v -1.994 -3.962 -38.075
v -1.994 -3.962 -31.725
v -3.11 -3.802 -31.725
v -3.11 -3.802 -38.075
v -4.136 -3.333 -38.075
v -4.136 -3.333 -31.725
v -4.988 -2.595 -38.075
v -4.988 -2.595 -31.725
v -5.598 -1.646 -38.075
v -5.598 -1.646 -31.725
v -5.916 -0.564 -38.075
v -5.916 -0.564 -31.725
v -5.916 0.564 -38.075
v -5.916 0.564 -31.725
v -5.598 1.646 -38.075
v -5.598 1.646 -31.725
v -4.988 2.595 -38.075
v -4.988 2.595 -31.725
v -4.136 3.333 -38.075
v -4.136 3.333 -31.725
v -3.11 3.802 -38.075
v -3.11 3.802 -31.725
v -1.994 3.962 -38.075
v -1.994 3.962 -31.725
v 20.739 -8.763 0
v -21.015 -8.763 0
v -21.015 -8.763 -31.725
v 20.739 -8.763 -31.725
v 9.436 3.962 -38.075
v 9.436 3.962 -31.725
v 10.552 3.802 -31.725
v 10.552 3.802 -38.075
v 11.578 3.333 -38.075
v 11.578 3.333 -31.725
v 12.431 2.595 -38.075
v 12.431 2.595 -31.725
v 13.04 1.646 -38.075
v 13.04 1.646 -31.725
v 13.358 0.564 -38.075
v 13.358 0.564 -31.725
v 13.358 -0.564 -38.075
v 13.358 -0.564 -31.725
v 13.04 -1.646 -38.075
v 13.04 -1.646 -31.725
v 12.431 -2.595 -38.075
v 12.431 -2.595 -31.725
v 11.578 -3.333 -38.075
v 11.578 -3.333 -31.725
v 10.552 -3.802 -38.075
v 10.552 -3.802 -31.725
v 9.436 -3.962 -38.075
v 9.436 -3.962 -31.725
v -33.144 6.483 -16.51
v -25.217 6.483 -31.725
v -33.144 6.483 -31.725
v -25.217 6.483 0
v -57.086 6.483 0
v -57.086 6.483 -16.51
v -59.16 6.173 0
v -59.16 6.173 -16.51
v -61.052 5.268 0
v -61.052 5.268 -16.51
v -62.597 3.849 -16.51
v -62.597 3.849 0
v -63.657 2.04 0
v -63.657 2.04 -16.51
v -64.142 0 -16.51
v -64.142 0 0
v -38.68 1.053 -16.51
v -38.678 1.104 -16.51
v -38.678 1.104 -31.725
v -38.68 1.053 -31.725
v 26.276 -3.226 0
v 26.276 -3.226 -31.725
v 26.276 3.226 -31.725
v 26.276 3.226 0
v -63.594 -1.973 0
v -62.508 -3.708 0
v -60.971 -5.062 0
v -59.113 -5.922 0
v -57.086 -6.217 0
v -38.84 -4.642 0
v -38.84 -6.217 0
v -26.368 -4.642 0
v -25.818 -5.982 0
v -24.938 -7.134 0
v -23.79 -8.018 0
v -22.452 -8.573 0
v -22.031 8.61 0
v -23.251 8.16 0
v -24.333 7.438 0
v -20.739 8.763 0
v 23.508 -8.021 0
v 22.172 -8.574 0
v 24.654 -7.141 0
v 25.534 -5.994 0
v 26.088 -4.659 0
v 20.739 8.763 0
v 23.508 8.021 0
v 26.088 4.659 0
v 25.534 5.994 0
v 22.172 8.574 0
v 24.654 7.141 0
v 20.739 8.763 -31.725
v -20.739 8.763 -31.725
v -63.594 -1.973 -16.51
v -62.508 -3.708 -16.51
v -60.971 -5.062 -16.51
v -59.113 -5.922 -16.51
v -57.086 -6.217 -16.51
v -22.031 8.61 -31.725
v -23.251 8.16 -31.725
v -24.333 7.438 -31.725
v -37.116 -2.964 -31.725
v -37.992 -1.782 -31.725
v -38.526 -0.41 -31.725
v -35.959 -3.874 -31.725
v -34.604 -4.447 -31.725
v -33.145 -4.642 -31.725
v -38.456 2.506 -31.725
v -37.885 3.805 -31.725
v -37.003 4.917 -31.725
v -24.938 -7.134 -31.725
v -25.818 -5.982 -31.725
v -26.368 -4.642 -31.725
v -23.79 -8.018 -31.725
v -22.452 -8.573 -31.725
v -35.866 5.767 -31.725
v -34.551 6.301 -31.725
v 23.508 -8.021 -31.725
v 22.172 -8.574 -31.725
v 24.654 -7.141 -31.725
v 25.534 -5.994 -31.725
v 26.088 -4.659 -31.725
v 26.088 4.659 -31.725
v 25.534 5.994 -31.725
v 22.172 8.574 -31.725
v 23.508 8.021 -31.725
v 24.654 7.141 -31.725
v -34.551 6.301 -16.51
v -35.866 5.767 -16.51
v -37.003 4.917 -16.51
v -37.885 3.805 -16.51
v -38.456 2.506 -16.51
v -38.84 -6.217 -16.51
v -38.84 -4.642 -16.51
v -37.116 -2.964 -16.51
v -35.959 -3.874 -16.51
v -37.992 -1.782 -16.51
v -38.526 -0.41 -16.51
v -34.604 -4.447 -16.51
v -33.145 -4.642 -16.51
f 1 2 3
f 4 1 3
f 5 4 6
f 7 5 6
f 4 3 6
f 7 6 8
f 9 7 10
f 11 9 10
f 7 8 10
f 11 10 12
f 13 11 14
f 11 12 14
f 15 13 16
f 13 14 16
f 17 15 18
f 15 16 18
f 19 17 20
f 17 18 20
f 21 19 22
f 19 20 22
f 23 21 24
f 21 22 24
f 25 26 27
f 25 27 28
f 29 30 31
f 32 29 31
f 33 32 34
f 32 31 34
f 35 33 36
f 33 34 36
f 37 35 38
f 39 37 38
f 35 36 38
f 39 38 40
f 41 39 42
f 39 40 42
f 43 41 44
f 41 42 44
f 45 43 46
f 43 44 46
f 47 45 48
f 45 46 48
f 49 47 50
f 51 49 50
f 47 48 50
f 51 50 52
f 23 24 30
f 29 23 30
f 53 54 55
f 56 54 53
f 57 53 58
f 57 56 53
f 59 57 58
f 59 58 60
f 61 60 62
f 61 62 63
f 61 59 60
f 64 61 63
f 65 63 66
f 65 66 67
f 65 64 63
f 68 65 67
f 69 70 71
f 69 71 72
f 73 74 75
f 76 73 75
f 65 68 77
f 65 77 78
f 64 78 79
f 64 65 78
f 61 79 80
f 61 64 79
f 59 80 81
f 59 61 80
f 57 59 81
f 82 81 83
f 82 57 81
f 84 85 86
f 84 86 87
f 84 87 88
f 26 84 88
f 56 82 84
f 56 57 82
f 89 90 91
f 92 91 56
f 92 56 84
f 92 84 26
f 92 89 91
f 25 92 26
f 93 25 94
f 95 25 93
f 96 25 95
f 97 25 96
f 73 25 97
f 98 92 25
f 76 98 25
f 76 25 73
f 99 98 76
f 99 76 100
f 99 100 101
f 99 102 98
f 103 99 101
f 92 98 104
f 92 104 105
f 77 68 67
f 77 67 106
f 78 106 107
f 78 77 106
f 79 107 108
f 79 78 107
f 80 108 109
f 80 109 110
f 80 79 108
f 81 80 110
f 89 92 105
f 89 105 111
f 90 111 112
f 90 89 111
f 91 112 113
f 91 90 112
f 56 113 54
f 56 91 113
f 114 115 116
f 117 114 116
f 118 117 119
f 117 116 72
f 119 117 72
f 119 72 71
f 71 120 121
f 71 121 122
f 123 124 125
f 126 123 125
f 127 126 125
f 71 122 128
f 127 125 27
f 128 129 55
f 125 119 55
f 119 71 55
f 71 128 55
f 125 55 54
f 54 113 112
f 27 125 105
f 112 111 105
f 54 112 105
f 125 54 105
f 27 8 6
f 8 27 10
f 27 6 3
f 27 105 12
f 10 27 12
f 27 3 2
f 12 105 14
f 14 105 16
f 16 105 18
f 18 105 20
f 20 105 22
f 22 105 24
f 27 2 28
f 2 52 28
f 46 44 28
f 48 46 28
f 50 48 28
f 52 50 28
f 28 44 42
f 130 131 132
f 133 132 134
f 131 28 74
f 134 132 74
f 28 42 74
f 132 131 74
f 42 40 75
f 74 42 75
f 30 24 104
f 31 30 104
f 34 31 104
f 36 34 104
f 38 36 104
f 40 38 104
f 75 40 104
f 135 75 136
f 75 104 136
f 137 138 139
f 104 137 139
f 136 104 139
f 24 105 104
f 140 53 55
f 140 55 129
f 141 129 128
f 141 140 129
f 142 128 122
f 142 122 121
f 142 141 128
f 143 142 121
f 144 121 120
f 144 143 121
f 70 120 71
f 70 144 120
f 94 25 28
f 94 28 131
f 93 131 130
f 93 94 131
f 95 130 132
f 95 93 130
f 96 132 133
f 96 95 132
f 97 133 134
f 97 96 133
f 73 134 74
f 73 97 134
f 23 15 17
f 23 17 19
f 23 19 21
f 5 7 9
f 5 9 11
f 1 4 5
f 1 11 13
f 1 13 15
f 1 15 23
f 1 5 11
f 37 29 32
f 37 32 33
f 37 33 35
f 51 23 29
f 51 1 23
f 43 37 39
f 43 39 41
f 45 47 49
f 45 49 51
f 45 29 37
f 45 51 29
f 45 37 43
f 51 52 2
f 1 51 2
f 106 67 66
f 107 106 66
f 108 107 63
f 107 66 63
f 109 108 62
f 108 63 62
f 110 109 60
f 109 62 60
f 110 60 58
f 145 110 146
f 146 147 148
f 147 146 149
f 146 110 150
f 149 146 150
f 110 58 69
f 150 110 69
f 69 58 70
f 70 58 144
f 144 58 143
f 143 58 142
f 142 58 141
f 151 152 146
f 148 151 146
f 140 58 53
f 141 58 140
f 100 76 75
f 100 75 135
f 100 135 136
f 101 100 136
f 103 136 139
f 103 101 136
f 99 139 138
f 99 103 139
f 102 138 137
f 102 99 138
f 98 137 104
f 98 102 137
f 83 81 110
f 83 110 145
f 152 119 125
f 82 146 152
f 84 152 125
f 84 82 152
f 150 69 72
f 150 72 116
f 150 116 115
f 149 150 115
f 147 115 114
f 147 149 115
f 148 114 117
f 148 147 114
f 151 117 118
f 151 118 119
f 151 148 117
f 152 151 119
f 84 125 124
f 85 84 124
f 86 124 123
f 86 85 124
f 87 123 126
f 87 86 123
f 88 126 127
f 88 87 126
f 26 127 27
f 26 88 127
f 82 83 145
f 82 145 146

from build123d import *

# Parameters (mm, degrees)
F1_DEPTH = 31.7246
F2_DEPTH = 16.51
F4_DEPTH = 6.35
F6_DEPTH = 16.51


with BuildPart() as f1:
    # F0 (on Top) → F1 (new body)
    with BuildSketch(Plane.XY):
        with BuildLine():
            ThreePointArc((26.2763, 3.2258), (24.654492, 7.141192), (20.7391, 8.763))
            Line((20.7391, 8.763), (-20.7391, 8.763))
            ThreePointArc((-20.7391, 8.763), (-23.251486, 8.16022), (-25.216874, 6.483118))
            Line((-25.216874, 6.483118), (-33.143533, 6.483118))
            ThreePointArc((-33.143533, 6.483118), (-37.002563, 4.916872), (-38.678471, 1.104186))
            Line((-38.678471, 1.104186), (-38.679923, 1.053386))
            ThreePointArc((-38.679923, 1.053386), (-37.115939, -2.963912), (-33.144986, -4.642082))
            Line((-33.144986, -4.642082), (-26.368298, -4.642082))
            ThreePointArc((-26.368298, -4.642082), (-24.393034, -7.613443), (-21.015287, -8.763))
            Line((-21.015287, -8.763), (20.7391, -8.763))
            ThreePointArc((20.7391, -8.763), (24.654492, -7.141192), (26.2763, -3.2258))
            Line((26.2763, -3.2258), (26.2763, 3.2258))
        make_face()
    extrude(amount=-F1_DEPTH)

    # F0 (on Top) → F2 (join)
    with BuildSketch(Plane.XY):
        with BuildLine():
            ThreePointArc((-38.678471, 1.104186), (-37.002563, 4.916872), (-33.143533, 6.483118))
            Line((-33.143533, 6.483118), (-38.910577, 6.483118))
            Line((-38.910577, 6.483118), (-57.0865, 6.483118))
            ThreePointArc((-57.0865, 6.483118), (-61.001892, 4.86131), (-62.6237, 0.945918))
            Line((-62.6237, 0.945918), (-62.6237, 0.895118))
            ThreePointArc((-62.6237, 0.895118), (-61.001892, -3.020274), (-57.0865, -4.642082))
            Line((-57.0865, -4.642082), (-38.839698, -4.642082))
            Line((-38.839698, -4.642082), (-33.144986, -4.642082))
            ThreePointArc((-33.144986, -4.642082), (-37.115939, -2.963912), (-38.679923, 1.053386))
            Line((-38.679923, 1.053386), (-38.678471, 1.104186))
        make_face()
    extrude(amount=-F2_DEPTH)

    # F3 (on face) → F4 (join)
    with BuildSketch(Plane(origin=(0, 0, -31.7246), x_dir=(1, 0, 0), z_dir=(0, 0, -1))):
        with BuildLine():
            ThreePointArc((-1.9939, 3.9624), (-5.9563, 0), (-1.9939, -3.9624))
            Line((-1.9939, -3.9624), (9.4361, -3.9624))
            ThreePointArc((9.4361, -3.9624), (13.3985, 0), (9.4361, 3.9624))
            Line((9.4361, 3.9624), (-1.9939, 3.9624))
        make_face()
    extrude(amount=F4_DEPTH)

    # F5 (on Top) → F6 (join)
    with BuildSketch(Plane.XY):
        with BuildLine():
            ThreePointArc((-57.0865, 6.483118), (-61.87738, 4.616227), (-64.141945, 0))
            ThreePointArc((-64.141945, 0), (-61.788333, -4.440921), (-57.0865, -6.216882))
            Line((-57.0865, -6.216882), (-38.839698, -6.216882))
            Line((-38.839698, -6.216882), (-38.839698, -4.598211))
            Line((-38.839698, -4.598211), (-38.839698, 6.483118))
            Line((-38.839698, 6.483118), (-57.0865, 6.483118))
        make_face()
    extrude(amount=-F6_DEPTH)


solid = f1.part
